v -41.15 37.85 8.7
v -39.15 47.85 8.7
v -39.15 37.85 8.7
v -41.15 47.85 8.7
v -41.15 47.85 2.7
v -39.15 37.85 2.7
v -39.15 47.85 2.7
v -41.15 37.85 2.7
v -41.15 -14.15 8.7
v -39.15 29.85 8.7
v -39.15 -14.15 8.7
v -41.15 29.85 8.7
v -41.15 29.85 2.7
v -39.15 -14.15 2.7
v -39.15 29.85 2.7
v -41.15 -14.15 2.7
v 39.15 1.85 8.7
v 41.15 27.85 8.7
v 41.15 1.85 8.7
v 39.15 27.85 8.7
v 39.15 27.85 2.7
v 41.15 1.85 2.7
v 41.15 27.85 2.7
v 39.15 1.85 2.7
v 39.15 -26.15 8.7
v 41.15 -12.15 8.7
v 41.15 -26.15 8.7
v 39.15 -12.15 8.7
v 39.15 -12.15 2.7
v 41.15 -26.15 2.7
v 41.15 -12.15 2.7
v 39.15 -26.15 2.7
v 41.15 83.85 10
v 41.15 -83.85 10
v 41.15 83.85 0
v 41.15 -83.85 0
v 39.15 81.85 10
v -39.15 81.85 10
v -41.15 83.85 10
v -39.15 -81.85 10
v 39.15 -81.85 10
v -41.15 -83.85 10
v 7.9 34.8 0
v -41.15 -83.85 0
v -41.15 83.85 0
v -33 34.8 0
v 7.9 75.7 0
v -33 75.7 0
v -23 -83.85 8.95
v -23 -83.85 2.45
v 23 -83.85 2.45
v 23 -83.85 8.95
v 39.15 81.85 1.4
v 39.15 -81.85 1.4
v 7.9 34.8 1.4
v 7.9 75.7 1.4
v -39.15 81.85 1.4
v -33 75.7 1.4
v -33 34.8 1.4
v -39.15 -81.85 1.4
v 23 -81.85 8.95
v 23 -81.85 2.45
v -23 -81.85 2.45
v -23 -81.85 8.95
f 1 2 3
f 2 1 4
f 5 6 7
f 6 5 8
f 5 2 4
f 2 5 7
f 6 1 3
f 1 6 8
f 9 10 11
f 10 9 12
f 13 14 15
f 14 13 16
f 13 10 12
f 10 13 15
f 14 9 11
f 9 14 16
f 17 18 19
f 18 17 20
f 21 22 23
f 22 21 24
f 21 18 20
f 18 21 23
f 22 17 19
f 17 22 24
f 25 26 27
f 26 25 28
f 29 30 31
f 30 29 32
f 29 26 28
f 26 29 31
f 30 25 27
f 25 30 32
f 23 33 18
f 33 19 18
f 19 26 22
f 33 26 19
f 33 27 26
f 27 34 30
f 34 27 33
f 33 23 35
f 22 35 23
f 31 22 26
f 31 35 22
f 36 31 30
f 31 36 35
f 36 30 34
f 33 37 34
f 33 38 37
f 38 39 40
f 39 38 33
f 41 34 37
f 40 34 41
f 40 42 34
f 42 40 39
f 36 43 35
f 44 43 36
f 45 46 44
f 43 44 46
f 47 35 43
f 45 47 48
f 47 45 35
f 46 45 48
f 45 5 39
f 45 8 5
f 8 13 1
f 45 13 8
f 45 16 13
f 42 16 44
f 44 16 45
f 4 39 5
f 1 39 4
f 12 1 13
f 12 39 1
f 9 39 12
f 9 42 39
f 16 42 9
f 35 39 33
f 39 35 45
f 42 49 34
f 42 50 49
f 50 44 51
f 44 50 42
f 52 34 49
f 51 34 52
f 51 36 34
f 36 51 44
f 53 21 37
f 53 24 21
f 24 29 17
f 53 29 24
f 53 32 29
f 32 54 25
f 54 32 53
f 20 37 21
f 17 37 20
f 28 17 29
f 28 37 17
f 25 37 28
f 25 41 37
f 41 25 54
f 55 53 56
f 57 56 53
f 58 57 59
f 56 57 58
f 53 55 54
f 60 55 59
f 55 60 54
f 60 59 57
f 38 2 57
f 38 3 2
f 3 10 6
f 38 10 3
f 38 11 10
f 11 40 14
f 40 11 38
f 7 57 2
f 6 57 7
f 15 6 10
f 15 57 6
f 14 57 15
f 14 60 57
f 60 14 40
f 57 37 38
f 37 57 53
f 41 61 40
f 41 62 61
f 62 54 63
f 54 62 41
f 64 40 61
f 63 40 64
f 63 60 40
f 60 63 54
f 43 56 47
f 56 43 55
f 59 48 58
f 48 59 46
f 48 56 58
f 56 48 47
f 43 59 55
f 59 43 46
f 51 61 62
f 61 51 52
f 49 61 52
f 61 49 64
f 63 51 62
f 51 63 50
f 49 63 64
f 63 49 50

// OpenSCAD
// file: BOSL2/std.scad
// Minimal BOSL2 compatibility shim for bundled gallery models.
// It implements only the helpers used by the imported OpenSCAD projects.

CENTER = [0, 0, 0];
BOTTOM = [0, 0, -1];
TOP = [0, 0, 1];
LEFT = [-1, 0, 0];
RIGHT = [1, 0, 0];
FRONT = [0, -1, 0];
BACK = [0, 1, 0];

module up(z=0) {
    translate([0, 0, z]) children();
}

module down(z=0) {
    translate([0, 0, -z]) children();
}

module attach(anchor=CENTER) {
    children();
}

module cuboid(size=[1, 1, 1], anchor=CENTER) {
    center = anchor == CENTER;
    translate(center ? [0, 0, 0] : [0, 0, size[2] / 2])
        cube(size, center=true);
    children();
}

module xcyl(h=1, r=1, anchor=CENTER) {
    center = anchor == CENTER;
    translate(center ? [0, 0, 0] : [h / 2, 0, 0])
        rotate([0, 90, 0])
            cylinder(h=h, r=r, center=true);
}
// main file
// iPhone 16 Pro Max case
// 2026-10-02. Nothing to do with the class board - kept out of that repository.
//
// PRINT THIS IN TPU, not PLA. A case has to stretch over the phone to get on and
// come off again; PLA will not flex, so either it will not go on at all or it
// cracks at a corner the first time you take it off. TPU 95A, printed slowly
// (20-30 mm/s) and fed from an external spool rather than the AMS.
//
// WHAT IS VERIFIED AND WHAT IS NOT
//   Verified from Apple's tech specs: the body is 163.0 x 77.6 x 8.25 mm.
//   Everything else below - the corner radius, the camera island, and every
//   button and port position - Apple does not publish. The numbers here are
//   estimates and WILL be slightly wrong. Measure your own phone with a caliper
//   (or a ruler against the edge) and correct them before printing the real one.
//   Each one is marked MEASURE.
//
// Measure from the TOP-LEFT corner of the BACK of the phone, looking at the back.

include <BOSL2/std.scad>
$fa = 2; $fs = 0.4;

// ---- verified ----------------------------------------------------------------
PH_H = 163.0;      // Apple tech specs
PH_W = 77.6;
PH_D = 8.25;

// ---- my choices --------------------------------------------------------------
FIT   = 0.35;      // slack around the phone. TPU 0.3-0.4; for a rigid material use 0.6+
WALL  = 2.0;       // side wall
BACK_T  = 1.4;       // back panel
LIP   = 1.8;       // how far the case folds over the front glass, all round
// BOSL2's cuboid takes rounding OR chamfer, not both, and the vertical corners
// are the ones that matter here - so the outer back edge is left square. In TPU
// that is soft enough not to notice.

// ---- MEASURE these -----------------------------------------------------------
PH_R  = 11.5;      // MEASURE: corner radius of the phone body
                   // too small and the case will not seat; too large leaves a gap

// Camera island, as a rectangle on the back. MEASURE all four.
CAM_X = 7.0;       // MEASURE: from the left edge to the left side of the island
CAM_Y = 7.0;       // MEASURE: from the top edge to the top of the island
CAM_W = 38.5;      // MEASURE: island width
CAM_H = 38.5;      // MEASURE: island height
CAM_R = 10.0;      // MEASURE: island corner radius
CAM_PAD = 1.2;     // extra clearance round the island so the case never touches a lens

// Buttons. Y is measured DOWN from the top edge of the phone.
// A single channel per cluster is more forgiving than one hole per button.
ACTION_Y   = 36.0; ACTION_L  = 10.0;   // MEASURE: Action button, left side
VOL_Y      = 54.0; VOL_L     = 44.0;   // MEASURE: volume up+down as one channel
POWER_Y    = 56.0; POWER_L   = 26.0;   // MEASURE: side button, right side
CAMCTRL_Y  = 96.0; CAMCTRL_L = 14.0;   // MEASURE: Camera Control, right side (new on 16)
BTN_DEPTH  = 6.0;                      // how tall the channel is, centred on the phone's thickness

// Bottom: USB-C and the speaker grilles, as one opening. MEASURE both.
BOT_W = 46.0;      // MEASURE: how wide the opening needs to be
BOT_D = 6.5;       // how tall

// ---- derived -----------------------------------------------------------------
CH   = PH_H + 2*FIT;              // cavity
CW   = PH_W + 2*FIT;
CD   = PH_D + FIT;
CR   = PH_R + FIT;
OH   = CH + 2*WALL;               // outer
OW   = CW + 2*WALL;
OD   = CD + BACK_T;
OR   = CR + WALL;

module case() {
  difference() {
    // outer shell
    cuboid([OW, OH, OD], rounding = OR, edges = "Z", anchor = BOTTOM);

    // the phone
    translate([0, 0, BACK_T])
      cuboid([CW, CH, CD + 1], rounding = CR, edges = "Z", anchor = BOTTOM);

    // front opening - the lip is what holds the phone in
    translate([0, 0, BACK_T + 1])
      cuboid([CW - 2*LIP, CH - 2*LIP, CD + 2], rounding = max(CR - LIP, 1),
             edges = "Z", anchor = BOTTOM);

    // camera island, measured from the top-left of the back
    translate([-OW/2 + WALL + FIT + CAM_X + CAM_W/2,
                OH/2 - WALL - FIT - CAM_Y - CAM_H/2,
               -1])
      cuboid([CAM_W + 2*CAM_PAD, CAM_H + 2*CAM_PAD, BACK_T + 2],
             rounding = CAM_R, edges = "Z", anchor = BOTTOM);

    // side buttons: [ side, y from top, length ]
    for (b = [[-1, ACTION_Y,  ACTION_L],
              [-1, VOL_Y,     VOL_L],
              [ 1, POWER_Y,   POWER_L],
              [ 1, CAMCTRL_Y, CAMCTRL_L]])
      translate([b[0] * OW/2, OH/2 - b[1] - b[2]/2, BACK_T + CD/2])
        cuboid([2*WALL + 2, b[2], BTN_DEPTH], rounding = 1, edges = "Y");

    // bottom: USB-C and the speakers
    translate([0, -OH/2, BACK_T + CD/2])
      cuboid([BOT_W, 2*WALL + 2, BOT_D], rounding = 1, edges = "X");
  }
}

case();

echo(str("phone   ", PH_H, " x ", PH_W, " x ", PH_D, "  (Apple tech specs)"));
echo(str("cavity  ", CH, " x ", CW, " x ", CD, "   slack ", FIT, " per side"));
echo(str("case    ", OH, " x ", OW, " x ", OD));
echo(str("lip     ", LIP, " over the glass; front opening ",
         CW - 2*LIP, " x ", CH - 2*LIP));
echo("PRINT IN TPU. Every number marked MEASURE is an estimate - check it first.");
